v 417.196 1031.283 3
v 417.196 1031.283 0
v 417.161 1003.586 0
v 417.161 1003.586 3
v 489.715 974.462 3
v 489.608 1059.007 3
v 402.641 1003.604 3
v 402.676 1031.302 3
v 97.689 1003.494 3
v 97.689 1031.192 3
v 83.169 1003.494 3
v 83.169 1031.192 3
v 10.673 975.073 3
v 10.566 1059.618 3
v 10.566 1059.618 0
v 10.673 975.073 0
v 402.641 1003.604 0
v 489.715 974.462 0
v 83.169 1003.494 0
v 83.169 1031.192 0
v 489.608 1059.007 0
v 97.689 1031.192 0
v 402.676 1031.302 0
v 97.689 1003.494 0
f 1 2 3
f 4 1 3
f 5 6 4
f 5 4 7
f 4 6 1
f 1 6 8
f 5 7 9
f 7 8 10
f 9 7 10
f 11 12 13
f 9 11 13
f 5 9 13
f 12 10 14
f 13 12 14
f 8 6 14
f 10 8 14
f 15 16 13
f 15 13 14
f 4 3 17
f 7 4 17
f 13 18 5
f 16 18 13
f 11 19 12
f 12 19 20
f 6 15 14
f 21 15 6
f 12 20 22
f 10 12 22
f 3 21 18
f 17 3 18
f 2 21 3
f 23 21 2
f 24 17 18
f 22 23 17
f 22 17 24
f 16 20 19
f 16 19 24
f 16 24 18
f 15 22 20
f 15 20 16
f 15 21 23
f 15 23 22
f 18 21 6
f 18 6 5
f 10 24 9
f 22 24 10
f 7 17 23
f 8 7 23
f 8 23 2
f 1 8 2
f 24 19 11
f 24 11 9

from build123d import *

# Parameters (mm, degrees)
SKETCH1_W           = 14.51987794
SKETCH1_H           = 27.697484205
BOSS_EXTRUDE1_DEPTH = 3


with BuildPart() as part:
    # Sketch1 → Boss-Extrude1 (new body)
    with BuildSketch(Plane.XY):
        Polygon((10.672922398, 975.073069212), (10.566207631, 1059.617843106), (489.608405369, 1059.006658046), (489.715120136, 974.461884152), align=None)
        with Locations((90.428871138, 1017.342955032)):
            Rectangle(SKETCH1_W, SKETCH1_H, mode=Mode.SUBTRACT)
        Polygon((402.675989281, 1031.301508945), (417.19585566, 1031.283185961), (417.160903536, 1003.585723809), (402.641037157, 1003.604046793), align=None, mode=Mode.SUBTRACT)
    extrude(amount=BOSS_EXTRUDE1_DEPTH)


solid = part.part
